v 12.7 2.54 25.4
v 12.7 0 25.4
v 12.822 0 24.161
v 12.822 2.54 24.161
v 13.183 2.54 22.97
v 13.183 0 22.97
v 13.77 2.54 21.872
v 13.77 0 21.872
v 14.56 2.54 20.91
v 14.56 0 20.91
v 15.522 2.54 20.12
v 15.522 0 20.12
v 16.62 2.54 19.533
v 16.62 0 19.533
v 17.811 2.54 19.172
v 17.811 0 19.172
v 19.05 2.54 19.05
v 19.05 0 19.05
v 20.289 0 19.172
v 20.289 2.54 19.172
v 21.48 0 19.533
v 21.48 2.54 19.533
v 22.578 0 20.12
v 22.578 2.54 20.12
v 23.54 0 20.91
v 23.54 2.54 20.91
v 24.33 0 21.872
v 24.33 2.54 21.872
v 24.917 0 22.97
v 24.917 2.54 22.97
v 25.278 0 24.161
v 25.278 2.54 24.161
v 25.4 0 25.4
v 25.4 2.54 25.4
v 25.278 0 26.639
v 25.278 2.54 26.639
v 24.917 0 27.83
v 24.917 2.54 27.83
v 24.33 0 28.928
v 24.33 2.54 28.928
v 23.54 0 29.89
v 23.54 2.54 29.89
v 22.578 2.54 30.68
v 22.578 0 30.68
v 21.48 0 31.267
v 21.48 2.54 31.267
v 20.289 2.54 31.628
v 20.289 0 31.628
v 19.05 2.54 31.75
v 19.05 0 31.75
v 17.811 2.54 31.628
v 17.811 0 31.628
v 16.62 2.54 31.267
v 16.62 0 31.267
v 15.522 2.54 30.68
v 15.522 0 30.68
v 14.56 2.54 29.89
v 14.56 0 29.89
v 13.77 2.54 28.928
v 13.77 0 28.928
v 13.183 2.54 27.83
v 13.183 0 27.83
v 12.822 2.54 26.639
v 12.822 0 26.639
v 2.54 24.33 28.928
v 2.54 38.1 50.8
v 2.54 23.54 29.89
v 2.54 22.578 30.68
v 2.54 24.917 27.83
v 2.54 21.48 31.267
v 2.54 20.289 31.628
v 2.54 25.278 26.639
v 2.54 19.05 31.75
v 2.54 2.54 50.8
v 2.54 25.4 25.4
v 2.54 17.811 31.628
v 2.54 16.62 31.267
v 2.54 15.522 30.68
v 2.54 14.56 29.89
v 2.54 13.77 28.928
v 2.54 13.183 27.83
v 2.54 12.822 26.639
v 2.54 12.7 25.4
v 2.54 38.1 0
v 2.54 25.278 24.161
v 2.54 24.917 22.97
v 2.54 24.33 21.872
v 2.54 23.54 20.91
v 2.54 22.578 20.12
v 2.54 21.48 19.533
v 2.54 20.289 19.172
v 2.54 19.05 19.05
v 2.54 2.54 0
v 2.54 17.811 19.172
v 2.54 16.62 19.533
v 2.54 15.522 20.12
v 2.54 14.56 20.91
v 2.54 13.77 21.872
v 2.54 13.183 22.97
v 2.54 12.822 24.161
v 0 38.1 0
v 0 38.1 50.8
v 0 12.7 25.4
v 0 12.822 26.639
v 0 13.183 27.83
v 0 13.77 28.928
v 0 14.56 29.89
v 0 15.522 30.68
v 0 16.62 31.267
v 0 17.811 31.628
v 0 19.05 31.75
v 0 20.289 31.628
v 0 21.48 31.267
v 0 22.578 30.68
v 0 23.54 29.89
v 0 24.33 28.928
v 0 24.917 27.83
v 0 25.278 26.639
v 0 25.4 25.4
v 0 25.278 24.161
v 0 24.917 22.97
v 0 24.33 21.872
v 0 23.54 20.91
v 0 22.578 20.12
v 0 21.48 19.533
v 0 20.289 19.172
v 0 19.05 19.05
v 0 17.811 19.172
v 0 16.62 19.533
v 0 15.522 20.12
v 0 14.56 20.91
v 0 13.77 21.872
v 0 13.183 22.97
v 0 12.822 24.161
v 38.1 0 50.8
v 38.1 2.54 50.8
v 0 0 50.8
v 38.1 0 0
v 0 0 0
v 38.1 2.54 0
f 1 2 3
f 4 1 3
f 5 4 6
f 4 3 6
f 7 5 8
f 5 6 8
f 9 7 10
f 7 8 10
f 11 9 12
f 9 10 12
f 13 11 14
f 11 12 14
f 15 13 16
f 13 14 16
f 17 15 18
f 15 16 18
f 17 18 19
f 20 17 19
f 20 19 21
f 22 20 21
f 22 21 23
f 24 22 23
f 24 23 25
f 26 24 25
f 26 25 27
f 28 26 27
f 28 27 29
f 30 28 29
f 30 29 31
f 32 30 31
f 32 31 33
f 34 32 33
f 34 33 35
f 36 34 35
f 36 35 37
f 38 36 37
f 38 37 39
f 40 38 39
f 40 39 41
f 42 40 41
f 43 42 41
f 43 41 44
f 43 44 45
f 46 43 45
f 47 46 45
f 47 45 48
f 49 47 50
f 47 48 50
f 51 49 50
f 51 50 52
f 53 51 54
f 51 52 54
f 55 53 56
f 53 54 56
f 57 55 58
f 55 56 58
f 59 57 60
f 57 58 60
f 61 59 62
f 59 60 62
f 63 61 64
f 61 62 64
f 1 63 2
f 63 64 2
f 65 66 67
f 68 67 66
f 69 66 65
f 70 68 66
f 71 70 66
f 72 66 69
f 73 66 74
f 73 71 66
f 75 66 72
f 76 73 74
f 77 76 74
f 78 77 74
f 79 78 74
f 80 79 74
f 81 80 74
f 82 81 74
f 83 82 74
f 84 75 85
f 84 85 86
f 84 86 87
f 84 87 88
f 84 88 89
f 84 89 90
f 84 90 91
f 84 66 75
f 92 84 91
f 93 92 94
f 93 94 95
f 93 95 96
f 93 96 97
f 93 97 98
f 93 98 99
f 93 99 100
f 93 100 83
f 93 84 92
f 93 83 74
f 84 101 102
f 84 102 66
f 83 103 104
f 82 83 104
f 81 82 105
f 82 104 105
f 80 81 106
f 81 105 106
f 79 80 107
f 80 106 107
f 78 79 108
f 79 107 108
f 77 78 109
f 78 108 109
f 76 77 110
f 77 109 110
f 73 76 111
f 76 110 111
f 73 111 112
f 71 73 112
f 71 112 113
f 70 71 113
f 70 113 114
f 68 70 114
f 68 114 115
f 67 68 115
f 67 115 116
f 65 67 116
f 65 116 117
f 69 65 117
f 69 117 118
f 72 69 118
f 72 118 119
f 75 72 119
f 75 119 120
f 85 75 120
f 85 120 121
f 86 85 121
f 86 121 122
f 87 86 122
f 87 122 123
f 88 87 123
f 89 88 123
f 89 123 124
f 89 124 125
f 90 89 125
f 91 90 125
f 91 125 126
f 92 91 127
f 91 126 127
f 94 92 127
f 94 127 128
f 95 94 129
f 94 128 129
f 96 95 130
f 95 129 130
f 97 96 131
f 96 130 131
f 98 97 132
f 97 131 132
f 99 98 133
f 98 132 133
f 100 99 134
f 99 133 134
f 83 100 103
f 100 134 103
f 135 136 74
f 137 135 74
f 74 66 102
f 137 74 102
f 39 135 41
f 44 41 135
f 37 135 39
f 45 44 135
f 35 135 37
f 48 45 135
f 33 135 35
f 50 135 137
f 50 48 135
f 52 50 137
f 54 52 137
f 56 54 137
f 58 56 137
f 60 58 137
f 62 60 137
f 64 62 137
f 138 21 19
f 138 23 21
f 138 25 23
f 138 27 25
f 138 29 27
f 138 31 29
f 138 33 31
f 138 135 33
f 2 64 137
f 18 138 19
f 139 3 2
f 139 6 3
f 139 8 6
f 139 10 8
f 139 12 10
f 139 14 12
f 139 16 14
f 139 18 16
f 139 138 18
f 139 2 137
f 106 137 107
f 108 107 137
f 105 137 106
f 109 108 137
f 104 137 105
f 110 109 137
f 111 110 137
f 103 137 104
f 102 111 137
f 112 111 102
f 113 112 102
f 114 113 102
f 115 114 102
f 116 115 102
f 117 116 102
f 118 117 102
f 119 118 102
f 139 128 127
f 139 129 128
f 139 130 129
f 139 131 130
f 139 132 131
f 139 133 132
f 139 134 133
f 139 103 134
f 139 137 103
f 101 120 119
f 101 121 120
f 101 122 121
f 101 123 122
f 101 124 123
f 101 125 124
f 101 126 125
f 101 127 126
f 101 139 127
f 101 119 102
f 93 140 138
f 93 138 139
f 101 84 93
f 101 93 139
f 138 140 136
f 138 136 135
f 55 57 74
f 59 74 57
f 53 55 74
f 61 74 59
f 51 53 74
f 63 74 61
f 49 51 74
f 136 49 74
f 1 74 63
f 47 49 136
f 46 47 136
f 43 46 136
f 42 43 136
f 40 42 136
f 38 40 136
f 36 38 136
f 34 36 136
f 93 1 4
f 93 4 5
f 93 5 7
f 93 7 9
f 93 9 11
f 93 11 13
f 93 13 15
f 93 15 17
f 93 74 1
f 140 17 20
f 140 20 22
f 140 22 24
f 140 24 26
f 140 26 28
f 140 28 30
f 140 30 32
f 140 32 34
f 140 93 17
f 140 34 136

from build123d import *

# Parameters (mm, degrees)
BOSS_EXTRUDE1_DEPTH       = 50.8
F_97_0_5_DIAMETER_HOLE1_D = 12.7
F_97_0_5_DIAMETER_HOLE2_D = 12.7


with BuildPart() as part:
    # Sketch1 → Boss-Extrude1 (new body)
    with BuildSketch(Plane.XY):
        Polygon((0, 0), (0, 38.1), (2.54, 38.1), (2.54, 2.54), (38.1, 2.54), (38.1, 0), align=None)
    extrude(amount=BOSS_EXTRUDE1_DEPTH)

    # #97 (0.5) Diameter Hole1 (through all)
    with Locations(Plane(origin=(2.54, 19.05, 25.4), x_dir=(0, 1, 0), z_dir=(1, 0, 0))):
        with Locations((0, 0)):
            Hole(F_97_0_5_DIAMETER_HOLE1_D / 2)

    # #97 (0.5) Diameter Hole2 (through all)
    with Locations(Plane(origin=(0, 2.54, 0), x_dir=(1, 0, 0), z_dir=(0, 1, 0))):
        with Locations((19.05, -25.4)):
            Hole(F_97_0_5_DIAMETER_HOLE2_D / 2)


solid = part.part
